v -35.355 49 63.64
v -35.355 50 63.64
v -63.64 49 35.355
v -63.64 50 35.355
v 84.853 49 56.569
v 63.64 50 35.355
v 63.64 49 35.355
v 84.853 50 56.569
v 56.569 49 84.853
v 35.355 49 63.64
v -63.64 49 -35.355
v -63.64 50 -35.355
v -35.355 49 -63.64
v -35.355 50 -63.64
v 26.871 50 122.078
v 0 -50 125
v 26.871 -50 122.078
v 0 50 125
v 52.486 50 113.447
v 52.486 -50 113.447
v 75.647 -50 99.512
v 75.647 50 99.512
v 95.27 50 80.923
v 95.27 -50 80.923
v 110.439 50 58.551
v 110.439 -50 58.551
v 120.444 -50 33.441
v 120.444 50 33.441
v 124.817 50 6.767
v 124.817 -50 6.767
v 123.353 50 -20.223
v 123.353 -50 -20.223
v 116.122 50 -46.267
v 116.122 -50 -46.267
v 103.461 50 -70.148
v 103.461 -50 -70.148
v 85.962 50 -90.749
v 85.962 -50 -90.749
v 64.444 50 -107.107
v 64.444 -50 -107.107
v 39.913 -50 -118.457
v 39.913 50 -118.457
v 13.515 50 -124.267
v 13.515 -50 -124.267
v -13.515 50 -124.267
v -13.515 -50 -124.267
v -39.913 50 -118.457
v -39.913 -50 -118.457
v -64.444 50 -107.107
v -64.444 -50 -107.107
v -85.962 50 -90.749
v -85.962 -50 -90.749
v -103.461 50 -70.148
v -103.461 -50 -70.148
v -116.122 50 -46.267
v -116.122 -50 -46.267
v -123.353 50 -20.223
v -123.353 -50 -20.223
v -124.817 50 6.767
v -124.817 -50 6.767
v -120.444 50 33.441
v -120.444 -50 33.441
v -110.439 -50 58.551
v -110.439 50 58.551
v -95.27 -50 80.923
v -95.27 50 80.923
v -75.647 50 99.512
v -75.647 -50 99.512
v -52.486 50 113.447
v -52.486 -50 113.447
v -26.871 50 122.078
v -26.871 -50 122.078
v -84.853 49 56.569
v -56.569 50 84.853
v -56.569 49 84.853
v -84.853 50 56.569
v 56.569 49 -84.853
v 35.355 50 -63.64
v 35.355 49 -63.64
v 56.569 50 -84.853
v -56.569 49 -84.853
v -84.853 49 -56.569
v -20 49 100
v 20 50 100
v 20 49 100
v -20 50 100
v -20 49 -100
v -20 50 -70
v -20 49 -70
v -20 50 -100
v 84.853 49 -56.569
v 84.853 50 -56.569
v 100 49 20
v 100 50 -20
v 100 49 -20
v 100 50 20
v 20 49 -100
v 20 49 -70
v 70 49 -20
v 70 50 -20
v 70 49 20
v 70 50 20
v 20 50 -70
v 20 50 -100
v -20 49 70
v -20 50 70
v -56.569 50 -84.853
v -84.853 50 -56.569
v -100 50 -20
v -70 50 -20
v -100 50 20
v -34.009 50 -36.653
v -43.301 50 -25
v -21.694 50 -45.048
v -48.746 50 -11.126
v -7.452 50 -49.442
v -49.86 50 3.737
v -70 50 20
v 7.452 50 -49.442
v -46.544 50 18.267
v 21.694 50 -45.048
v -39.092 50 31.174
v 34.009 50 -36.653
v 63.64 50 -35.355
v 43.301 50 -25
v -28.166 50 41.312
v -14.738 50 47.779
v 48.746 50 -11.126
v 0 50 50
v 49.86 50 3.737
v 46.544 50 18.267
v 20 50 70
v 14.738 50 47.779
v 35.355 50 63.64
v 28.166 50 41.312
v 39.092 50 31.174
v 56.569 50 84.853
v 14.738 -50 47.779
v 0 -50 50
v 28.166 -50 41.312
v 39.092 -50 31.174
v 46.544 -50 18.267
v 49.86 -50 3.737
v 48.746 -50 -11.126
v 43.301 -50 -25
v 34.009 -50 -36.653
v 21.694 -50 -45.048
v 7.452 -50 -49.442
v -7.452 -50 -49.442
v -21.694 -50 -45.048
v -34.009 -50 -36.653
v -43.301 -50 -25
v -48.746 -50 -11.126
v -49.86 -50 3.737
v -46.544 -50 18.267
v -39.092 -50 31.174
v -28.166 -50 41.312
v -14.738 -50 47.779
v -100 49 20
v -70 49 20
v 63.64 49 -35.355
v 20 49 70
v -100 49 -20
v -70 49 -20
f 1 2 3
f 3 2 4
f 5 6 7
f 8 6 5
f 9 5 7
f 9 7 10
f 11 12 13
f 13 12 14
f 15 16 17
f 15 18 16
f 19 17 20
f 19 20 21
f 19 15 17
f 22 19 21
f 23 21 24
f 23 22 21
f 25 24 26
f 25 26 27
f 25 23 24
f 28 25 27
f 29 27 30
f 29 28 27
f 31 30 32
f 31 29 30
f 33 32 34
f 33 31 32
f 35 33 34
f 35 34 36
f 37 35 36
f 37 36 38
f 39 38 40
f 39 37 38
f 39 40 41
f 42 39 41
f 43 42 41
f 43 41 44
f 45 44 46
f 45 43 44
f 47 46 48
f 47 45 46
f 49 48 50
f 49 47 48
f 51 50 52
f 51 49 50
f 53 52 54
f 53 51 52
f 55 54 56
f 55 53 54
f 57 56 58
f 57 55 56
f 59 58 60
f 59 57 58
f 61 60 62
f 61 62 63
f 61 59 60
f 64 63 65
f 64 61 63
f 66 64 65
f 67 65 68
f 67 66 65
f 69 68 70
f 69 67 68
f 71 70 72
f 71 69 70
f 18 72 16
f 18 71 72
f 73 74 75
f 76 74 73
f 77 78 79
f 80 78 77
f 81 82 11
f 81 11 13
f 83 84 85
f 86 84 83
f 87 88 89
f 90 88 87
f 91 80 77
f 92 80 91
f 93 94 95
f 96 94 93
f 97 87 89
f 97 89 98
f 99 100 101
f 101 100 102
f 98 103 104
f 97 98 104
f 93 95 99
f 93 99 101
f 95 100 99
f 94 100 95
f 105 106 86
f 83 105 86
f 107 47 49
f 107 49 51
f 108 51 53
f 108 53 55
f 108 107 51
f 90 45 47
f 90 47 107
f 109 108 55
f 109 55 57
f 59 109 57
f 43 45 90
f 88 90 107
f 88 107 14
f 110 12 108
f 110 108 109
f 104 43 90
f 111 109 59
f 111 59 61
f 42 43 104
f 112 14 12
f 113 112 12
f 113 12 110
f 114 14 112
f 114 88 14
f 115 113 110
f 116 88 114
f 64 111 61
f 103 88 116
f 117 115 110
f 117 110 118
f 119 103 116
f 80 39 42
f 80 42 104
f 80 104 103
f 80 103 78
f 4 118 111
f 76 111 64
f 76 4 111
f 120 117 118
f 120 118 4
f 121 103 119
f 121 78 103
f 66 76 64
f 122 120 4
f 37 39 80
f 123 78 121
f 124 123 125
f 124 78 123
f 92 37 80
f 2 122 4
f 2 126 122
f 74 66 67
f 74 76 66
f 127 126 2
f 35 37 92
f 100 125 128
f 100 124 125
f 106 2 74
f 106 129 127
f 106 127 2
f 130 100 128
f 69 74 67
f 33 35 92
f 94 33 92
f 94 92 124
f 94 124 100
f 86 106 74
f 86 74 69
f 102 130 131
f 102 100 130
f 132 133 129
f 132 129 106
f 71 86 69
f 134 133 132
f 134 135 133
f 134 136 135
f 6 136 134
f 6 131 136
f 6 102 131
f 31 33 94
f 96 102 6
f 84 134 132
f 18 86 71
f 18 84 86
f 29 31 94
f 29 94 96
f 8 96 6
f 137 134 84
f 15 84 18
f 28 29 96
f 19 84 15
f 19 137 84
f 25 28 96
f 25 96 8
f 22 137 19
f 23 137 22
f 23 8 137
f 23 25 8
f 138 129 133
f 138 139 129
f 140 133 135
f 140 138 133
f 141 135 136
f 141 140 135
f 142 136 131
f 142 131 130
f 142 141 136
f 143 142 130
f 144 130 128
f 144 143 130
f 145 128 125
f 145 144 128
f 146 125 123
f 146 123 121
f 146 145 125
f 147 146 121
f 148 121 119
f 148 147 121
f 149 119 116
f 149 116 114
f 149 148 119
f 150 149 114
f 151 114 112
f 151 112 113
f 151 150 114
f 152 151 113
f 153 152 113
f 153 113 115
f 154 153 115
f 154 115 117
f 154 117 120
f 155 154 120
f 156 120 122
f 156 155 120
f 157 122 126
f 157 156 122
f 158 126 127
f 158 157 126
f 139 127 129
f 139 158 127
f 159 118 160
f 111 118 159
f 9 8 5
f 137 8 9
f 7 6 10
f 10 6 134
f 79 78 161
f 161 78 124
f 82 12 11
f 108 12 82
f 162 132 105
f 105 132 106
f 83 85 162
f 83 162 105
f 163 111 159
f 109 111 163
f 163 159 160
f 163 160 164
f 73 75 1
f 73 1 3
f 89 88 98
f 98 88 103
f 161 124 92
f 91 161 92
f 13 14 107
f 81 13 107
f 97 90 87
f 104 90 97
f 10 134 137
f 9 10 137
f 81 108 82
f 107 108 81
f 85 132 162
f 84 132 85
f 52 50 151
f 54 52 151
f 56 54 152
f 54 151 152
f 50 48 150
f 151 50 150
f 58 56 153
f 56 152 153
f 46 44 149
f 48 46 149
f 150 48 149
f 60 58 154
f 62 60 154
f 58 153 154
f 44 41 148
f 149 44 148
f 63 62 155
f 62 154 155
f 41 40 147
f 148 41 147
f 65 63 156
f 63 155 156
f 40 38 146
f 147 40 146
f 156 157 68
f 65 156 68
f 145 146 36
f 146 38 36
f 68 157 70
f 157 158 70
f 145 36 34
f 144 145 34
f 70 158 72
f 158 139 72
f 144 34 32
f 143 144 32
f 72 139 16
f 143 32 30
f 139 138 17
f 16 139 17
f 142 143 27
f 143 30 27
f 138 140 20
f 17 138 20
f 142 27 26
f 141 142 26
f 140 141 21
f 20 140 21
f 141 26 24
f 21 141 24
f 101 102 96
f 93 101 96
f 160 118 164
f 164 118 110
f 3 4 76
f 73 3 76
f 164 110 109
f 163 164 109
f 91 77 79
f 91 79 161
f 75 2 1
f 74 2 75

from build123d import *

# Parameters (mm, degrees)
SKETCH1_R           = 125
SKETCH1_R_2         = 50
BOSS_EXTRUDE1_DEPTH = 50
SKETCH2_W           = 40
SKETCH2_H           = 30
CUT_EXTRUDE1_DEPTH  = 1
CIRPATTERN1_COUNT   = 8


with BuildPart() as part:
    # Sketch1 → Boss-Extrude1 (new, symmetric)
    with BuildSketch(Plane(origin=(0, 0, 0), x_dir=(1, 0, 0), z_dir=(0, 1, 0))):
        with Locations(Location((0, 0, 0), (0, 0, 270))):
            Circle(SKETCH1_R)
        with Locations(Location((0, 0, 0), (0, 0, 270))):
            Circle(SKETCH1_R_2, mode=Mode.SUBTRACT)
    extrude(amount=BOSS_EXTRUDE1_DEPTH, both=True)

    # Sketch2 → Cut-Extrude1 (cut)
    with BuildSketch(Plane(origin=(0, 50, 0), x_dir=(1, 0, 0), z_dir=(0, 1, 0))):
        with Locations((0, 85)):
            Rectangle(SKETCH2_W, SKETCH2_H)
    cut_extrude1 = extrude(amount=-CUT_EXTRUDE1_DEPTH, mode=Mode.SUBTRACT)

    # CirPattern1: Cut-Extrude1 ×8 about axis
    cirpattern1_axis = Axis((0, 0, 0), (0, 1, 0))
    for i in range(1, CIRPATTERN1_COUNT):
        add(cut_extrude1.rotate(cirpattern1_axis, i * 360 / CIRPATTERN1_COUNT), mode=Mode.SUBTRACT)


solid = part.part
